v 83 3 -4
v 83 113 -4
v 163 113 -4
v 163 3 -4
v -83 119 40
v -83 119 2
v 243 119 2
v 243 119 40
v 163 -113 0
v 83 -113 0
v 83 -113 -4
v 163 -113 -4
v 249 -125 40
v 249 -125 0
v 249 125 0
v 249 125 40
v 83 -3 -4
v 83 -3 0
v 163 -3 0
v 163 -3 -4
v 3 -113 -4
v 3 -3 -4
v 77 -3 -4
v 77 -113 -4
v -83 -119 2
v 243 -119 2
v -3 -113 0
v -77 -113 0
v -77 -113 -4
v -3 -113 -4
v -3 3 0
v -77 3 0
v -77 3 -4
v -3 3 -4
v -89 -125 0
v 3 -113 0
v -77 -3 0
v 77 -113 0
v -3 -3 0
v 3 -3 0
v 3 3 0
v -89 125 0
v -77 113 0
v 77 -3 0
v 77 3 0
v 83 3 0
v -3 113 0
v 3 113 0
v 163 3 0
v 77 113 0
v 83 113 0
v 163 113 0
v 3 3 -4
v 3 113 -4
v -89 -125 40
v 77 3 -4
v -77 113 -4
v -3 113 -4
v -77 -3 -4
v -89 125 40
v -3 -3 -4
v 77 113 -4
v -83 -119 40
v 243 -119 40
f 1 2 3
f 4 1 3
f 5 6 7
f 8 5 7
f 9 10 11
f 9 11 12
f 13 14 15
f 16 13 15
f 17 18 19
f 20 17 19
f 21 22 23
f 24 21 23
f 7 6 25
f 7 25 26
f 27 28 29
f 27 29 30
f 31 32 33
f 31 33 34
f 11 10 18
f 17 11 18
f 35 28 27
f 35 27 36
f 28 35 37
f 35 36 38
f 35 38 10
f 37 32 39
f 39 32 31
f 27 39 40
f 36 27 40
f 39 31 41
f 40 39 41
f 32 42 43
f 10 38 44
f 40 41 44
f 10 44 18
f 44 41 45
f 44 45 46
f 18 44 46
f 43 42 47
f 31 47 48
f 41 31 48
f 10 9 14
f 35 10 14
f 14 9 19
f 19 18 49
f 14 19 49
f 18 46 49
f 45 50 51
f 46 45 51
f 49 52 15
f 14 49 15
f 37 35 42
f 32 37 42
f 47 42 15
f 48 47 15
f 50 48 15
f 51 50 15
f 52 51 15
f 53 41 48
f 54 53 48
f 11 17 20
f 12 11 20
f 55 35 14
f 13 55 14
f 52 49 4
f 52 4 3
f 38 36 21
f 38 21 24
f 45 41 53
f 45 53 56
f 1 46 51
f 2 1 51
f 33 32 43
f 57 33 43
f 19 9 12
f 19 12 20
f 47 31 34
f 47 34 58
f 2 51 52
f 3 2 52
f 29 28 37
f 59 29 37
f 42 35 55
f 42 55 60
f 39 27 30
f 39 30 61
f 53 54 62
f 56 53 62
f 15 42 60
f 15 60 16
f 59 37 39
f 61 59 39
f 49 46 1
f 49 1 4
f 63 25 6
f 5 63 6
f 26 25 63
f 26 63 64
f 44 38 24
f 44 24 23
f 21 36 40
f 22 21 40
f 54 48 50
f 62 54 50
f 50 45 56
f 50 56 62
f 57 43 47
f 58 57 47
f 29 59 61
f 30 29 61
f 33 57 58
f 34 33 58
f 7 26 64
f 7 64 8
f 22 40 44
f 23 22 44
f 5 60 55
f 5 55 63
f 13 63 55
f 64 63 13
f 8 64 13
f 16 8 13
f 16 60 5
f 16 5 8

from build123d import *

# Parameters (mm, degrees)
F0_W     = 326
F0_H     = 238
F0_W_2   = 74
F0_H_2   = 110
F0_W_3   = 80
F1_DEPTH = 2
F2_DEPTH = 4
F0_W_4   = 338
F0_H_3   = 250
F3_DEPTH = 40


with BuildPart() as f1:
    # F0 (on Top) → F1 (new body)
    with BuildSketch(Plane.XY):
        with Locations((80, 0)):
            Rectangle(F0_W, F0_H)
        with Locations((-40, -58)):
            Rectangle(F0_W_2, F0_H_2, mode=Mode.SUBTRACT)
        with Locations((40, -58)):
            Rectangle(F0_W_2, F0_H_2, mode=Mode.SUBTRACT)
        with Locations((123, -58)):
            Rectangle(F0_W_3, F0_H_2, mode=Mode.SUBTRACT)
        with Locations((-40, 58)):
            Rectangle(F0_W_2, F0_H_2, mode=Mode.SUBTRACT)
        with Locations((40, 58)):
            Rectangle(F0_W_2, F0_H_2, mode=Mode.SUBTRACT)
        with Locations((123, 58)):
            Rectangle(F0_W_3, F0_H_2, mode=Mode.SUBTRACT)
        with Locations((123, -58)):
            Rectangle(F0_W_3, F0_H_2)
        with Locations((123, 58)):
            Rectangle(F0_W_3, F0_H_2)
        with Locations((40, 58)):
            Rectangle(F0_W_2, F0_H_2)
        with Locations((40, -58)):
            Rectangle(F0_W_2, F0_H_2)
        with Locations((-40, -58)):
            Rectangle(F0_W_2, F0_H_2)
        with Locations((-40, 58)):
            Rectangle(F0_W_2, F0_H_2)
    extrude(amount=F1_DEPTH)

    # F0 (on Top) → F2 (join)
    with BuildSketch(Plane.XY):
        with Locations((123, -58)):
            Rectangle(F0_W_3, F0_H_2)
        with Locations((40, -58)):
            Rectangle(F0_W_2, F0_H_2)
        with Locations((-40, -58)):
            Rectangle(F0_W_2, F0_H_2)
        with Locations((123, 58)):
            Rectangle(F0_W_3, F0_H_2)
        with Locations((40, 58)):
            Rectangle(F0_W_2, F0_H_2)
        with Locations((-40, 58)):
            Rectangle(F0_W_2, F0_H_2)
    extrude(amount=-F2_DEPTH)

    # F0 (on Top) → F3 (join)
    with BuildSketch(Plane.XY):
        with Locations((80, 0)):
            Rectangle(F0_W_4, F0_H_3)
        with Locations((80, 0)):
            Rectangle(F0_W, F0_H, mode=Mode.SUBTRACT)
    extrude(amount=F3_DEPTH)


solid = f1.part
